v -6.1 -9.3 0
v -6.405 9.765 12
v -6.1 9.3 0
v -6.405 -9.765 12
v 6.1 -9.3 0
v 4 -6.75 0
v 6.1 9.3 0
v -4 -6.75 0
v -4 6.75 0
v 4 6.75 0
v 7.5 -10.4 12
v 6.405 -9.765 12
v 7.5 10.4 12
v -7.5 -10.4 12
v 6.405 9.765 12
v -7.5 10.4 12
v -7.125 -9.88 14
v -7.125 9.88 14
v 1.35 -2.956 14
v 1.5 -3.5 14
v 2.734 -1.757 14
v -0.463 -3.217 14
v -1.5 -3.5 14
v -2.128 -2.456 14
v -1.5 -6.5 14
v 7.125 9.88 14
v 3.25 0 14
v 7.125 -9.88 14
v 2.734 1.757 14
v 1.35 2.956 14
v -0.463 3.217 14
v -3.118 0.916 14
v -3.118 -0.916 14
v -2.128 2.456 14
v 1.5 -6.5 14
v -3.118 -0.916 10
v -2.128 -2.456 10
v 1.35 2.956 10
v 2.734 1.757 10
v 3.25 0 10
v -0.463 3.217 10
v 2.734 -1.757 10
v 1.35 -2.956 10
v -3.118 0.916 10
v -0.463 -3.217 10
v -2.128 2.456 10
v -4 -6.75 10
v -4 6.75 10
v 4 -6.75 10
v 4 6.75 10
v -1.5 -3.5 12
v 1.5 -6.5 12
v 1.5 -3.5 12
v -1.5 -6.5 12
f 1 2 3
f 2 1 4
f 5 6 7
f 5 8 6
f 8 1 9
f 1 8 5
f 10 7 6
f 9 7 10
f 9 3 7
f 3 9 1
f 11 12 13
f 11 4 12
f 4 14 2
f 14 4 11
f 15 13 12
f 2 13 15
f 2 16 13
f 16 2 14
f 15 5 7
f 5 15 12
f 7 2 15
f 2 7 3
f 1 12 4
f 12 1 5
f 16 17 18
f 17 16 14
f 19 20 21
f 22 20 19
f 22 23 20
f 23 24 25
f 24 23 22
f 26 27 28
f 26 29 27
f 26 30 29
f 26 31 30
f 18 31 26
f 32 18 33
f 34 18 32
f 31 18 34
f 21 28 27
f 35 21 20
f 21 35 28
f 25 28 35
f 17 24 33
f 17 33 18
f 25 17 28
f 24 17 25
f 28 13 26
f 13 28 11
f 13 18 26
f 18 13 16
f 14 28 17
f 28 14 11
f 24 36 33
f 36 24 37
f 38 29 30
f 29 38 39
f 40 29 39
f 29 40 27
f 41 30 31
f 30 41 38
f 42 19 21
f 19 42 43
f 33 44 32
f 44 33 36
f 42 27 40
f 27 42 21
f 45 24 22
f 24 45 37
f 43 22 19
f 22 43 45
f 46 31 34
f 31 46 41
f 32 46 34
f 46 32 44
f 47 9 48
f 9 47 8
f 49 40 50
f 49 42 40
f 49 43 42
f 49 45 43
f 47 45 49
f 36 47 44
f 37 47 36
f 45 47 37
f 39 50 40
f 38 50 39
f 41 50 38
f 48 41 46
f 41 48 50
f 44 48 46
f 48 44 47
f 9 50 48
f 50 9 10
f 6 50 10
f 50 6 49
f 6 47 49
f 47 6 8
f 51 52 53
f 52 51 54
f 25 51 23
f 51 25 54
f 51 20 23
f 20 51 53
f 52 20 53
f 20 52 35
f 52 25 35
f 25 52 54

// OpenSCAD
// switch adapter for dremmel
difference(){
    union(){
        linear_extrude(height=12,scale=1.05) square(size=[12.2,18.6],center=true);

        translate([0,0,12])
        linear_extrude(height=2,scale=0.95) square(size=[15,20.8],center=true);
    }

    translate([0,0,-1]) cylinder(r=3.25,h=30);

    translate([0,0,0])
        linear_extrude(height=10,scale=1) square(size=[8,13.5],center=true);

    translate([0,-5,12])
        linear_extrude(height=2,scale=1) 
        square(size=[3,3],center=true);

}
